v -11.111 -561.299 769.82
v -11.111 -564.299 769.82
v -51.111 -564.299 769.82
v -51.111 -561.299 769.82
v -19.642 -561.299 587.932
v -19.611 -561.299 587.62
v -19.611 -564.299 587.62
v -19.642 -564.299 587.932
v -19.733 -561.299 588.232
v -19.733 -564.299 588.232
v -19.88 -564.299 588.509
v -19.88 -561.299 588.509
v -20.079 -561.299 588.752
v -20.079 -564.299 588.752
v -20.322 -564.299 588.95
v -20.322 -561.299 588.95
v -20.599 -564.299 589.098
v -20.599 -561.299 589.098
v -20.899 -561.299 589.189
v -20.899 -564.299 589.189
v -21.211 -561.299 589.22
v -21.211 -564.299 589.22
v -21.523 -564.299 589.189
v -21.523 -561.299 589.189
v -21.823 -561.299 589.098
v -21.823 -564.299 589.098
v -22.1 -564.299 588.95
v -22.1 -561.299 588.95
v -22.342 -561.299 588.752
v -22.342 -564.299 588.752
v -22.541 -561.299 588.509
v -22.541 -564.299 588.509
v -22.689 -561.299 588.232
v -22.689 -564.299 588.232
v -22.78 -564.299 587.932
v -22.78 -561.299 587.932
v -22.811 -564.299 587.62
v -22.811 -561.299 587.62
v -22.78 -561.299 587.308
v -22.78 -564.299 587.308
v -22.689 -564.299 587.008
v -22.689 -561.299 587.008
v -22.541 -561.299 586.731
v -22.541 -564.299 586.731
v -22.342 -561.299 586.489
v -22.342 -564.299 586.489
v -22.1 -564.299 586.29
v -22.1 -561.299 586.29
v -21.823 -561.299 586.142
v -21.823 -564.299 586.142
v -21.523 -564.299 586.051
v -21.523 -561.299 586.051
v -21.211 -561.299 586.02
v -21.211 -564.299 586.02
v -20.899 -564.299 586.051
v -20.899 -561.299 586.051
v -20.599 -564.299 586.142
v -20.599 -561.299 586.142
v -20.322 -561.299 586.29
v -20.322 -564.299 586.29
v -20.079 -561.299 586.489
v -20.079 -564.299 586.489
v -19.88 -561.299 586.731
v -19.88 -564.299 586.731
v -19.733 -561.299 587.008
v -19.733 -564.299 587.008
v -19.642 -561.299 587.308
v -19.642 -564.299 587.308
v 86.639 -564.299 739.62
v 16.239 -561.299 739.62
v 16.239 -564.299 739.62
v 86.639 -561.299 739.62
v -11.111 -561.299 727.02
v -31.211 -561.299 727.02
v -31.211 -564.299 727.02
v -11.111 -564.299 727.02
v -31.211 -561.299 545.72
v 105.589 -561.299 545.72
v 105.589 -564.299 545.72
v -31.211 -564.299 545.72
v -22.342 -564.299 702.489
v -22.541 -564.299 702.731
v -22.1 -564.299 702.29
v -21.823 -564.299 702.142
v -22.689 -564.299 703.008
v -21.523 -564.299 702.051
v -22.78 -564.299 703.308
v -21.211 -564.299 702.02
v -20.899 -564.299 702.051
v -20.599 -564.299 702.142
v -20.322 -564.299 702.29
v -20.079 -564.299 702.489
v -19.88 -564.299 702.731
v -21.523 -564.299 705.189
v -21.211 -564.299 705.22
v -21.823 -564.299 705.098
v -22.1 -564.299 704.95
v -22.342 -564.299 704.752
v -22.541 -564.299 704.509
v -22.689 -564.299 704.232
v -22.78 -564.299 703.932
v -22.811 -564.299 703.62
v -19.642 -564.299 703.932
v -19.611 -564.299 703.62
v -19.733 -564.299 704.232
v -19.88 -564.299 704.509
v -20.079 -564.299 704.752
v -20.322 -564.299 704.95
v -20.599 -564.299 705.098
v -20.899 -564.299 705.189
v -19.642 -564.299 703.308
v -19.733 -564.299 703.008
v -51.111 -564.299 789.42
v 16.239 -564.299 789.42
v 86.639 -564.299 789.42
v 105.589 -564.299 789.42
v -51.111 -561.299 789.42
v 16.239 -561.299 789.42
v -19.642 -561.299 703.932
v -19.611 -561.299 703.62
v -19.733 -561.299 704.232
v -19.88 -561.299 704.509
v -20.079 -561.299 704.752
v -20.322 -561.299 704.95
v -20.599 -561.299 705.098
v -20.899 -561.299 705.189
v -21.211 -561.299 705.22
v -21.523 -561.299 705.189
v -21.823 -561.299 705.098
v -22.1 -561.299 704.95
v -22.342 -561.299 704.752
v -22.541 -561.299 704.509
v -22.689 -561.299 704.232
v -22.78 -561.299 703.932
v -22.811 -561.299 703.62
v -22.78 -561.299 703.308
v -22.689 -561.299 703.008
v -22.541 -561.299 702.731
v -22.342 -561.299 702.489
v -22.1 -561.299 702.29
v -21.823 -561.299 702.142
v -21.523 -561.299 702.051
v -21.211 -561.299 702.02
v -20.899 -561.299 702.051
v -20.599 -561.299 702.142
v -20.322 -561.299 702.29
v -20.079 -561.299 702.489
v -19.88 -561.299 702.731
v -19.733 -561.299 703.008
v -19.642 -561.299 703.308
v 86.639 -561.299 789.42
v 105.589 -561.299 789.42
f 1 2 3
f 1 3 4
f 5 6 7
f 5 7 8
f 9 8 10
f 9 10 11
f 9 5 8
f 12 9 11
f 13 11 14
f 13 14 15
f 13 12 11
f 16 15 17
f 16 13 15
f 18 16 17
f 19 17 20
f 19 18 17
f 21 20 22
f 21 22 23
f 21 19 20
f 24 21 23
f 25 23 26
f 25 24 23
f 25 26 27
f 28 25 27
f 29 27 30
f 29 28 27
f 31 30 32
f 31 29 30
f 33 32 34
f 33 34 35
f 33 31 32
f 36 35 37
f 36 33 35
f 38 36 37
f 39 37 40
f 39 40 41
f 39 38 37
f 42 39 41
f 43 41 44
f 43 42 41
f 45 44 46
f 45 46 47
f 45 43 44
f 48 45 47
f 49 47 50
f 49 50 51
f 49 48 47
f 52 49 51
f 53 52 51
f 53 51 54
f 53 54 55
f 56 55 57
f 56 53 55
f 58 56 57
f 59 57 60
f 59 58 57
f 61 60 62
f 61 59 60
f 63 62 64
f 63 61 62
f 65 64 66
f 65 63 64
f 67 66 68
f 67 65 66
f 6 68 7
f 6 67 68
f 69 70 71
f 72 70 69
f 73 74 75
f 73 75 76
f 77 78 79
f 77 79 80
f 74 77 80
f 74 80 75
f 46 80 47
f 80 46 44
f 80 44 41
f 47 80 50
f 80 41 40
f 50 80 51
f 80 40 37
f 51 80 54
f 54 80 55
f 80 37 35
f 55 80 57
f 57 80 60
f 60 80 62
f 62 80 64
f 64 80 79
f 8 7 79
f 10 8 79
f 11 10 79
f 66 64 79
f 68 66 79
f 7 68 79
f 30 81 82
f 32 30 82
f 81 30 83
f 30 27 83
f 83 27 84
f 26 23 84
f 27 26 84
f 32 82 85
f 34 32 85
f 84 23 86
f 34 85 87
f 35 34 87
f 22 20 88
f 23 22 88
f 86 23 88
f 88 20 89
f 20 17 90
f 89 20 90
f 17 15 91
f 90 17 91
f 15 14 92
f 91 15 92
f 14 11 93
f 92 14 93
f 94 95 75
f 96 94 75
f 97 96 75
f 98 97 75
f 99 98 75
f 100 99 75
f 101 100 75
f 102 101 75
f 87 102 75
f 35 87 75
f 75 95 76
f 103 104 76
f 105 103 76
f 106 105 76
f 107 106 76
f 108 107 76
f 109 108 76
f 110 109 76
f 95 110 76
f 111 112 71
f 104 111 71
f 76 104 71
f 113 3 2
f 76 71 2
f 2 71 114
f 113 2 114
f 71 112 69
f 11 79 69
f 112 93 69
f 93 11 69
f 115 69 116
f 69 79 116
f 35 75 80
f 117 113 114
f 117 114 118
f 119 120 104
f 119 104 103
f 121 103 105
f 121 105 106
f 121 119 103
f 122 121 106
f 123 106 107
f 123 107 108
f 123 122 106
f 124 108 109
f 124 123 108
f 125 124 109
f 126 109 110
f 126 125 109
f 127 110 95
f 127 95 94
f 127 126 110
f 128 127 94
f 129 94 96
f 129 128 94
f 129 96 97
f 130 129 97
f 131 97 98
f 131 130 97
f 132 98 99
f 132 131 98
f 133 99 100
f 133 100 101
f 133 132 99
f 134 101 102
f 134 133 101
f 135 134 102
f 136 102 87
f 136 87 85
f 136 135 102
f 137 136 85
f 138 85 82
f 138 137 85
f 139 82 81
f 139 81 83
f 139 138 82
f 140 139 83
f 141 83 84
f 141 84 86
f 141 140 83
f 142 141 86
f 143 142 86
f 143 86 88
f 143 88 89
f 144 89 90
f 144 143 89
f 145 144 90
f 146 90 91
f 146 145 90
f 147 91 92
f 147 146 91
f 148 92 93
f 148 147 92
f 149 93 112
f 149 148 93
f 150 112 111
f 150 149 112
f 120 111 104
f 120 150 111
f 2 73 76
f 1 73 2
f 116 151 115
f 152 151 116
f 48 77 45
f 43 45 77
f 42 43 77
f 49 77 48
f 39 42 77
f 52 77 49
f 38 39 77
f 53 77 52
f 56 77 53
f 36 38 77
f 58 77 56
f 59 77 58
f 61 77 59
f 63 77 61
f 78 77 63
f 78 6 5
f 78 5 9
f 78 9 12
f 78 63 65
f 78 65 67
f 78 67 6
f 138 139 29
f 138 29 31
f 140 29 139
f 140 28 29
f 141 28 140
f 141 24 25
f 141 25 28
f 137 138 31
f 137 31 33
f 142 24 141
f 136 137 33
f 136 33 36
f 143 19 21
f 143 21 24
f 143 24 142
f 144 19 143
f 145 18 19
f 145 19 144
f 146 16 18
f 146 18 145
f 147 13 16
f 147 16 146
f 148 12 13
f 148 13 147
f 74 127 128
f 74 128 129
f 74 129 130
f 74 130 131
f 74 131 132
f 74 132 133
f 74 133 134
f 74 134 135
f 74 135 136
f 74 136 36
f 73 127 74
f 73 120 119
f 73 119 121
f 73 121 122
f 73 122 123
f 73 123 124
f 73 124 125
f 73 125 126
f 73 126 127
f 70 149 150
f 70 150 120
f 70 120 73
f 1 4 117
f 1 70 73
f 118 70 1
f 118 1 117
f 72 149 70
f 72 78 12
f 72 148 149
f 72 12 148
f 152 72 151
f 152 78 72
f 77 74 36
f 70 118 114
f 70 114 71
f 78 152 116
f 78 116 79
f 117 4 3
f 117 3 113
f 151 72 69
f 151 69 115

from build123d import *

# Parameters (mm, degrees)
SKETCH1_R           = 1.6
BOSS_EXTRUDE1_DEPTH = 3
SKETCH2_W           = 19.6
SKETCH2_H           = 3
BOSS_EXTRUDE2_DEPTH = 40


with BuildPart() as part:
    # Sketch1 → Boss-Extrude1 (new body)
    with BuildSketch(Plane.XZ.offset(561.298939869)):
        Polygon((-11.110843614, 789.420141885), (16.239156386, 789.420141885), (16.239156386, 739.620141885), (86.639156386, 739.620141885), (86.639156386, 789.420141885), (105.589156386, 789.420141885), (105.589156386, 545.720141885), (-31.210843614, 545.720141885), (-31.210843614, 727.020141885), (-11.110843614, 727.020141885), align=None)
        with Locations((-21.210843614, 703.620141885)):
            Circle(SKETCH1_R, mode=Mode.SUBTRACT)
        with Locations((-21.210843614, 587.620141885)):
            Circle(SKETCH1_R, mode=Mode.SUBTRACT)
    extrude(amount=BOSS_EXTRUDE1_DEPTH)

    # Sketch2 → Boss-Extrude2 (add)
    with BuildSketch(Plane.ZY.offset(11.110843614)):
        with Locations((779.620141885, -562.798939869)):
            Rectangle(SKETCH2_W, SKETCH2_H)
    extrude(amount=BOSS_EXTRUDE2_DEPTH)


solid = part.part
